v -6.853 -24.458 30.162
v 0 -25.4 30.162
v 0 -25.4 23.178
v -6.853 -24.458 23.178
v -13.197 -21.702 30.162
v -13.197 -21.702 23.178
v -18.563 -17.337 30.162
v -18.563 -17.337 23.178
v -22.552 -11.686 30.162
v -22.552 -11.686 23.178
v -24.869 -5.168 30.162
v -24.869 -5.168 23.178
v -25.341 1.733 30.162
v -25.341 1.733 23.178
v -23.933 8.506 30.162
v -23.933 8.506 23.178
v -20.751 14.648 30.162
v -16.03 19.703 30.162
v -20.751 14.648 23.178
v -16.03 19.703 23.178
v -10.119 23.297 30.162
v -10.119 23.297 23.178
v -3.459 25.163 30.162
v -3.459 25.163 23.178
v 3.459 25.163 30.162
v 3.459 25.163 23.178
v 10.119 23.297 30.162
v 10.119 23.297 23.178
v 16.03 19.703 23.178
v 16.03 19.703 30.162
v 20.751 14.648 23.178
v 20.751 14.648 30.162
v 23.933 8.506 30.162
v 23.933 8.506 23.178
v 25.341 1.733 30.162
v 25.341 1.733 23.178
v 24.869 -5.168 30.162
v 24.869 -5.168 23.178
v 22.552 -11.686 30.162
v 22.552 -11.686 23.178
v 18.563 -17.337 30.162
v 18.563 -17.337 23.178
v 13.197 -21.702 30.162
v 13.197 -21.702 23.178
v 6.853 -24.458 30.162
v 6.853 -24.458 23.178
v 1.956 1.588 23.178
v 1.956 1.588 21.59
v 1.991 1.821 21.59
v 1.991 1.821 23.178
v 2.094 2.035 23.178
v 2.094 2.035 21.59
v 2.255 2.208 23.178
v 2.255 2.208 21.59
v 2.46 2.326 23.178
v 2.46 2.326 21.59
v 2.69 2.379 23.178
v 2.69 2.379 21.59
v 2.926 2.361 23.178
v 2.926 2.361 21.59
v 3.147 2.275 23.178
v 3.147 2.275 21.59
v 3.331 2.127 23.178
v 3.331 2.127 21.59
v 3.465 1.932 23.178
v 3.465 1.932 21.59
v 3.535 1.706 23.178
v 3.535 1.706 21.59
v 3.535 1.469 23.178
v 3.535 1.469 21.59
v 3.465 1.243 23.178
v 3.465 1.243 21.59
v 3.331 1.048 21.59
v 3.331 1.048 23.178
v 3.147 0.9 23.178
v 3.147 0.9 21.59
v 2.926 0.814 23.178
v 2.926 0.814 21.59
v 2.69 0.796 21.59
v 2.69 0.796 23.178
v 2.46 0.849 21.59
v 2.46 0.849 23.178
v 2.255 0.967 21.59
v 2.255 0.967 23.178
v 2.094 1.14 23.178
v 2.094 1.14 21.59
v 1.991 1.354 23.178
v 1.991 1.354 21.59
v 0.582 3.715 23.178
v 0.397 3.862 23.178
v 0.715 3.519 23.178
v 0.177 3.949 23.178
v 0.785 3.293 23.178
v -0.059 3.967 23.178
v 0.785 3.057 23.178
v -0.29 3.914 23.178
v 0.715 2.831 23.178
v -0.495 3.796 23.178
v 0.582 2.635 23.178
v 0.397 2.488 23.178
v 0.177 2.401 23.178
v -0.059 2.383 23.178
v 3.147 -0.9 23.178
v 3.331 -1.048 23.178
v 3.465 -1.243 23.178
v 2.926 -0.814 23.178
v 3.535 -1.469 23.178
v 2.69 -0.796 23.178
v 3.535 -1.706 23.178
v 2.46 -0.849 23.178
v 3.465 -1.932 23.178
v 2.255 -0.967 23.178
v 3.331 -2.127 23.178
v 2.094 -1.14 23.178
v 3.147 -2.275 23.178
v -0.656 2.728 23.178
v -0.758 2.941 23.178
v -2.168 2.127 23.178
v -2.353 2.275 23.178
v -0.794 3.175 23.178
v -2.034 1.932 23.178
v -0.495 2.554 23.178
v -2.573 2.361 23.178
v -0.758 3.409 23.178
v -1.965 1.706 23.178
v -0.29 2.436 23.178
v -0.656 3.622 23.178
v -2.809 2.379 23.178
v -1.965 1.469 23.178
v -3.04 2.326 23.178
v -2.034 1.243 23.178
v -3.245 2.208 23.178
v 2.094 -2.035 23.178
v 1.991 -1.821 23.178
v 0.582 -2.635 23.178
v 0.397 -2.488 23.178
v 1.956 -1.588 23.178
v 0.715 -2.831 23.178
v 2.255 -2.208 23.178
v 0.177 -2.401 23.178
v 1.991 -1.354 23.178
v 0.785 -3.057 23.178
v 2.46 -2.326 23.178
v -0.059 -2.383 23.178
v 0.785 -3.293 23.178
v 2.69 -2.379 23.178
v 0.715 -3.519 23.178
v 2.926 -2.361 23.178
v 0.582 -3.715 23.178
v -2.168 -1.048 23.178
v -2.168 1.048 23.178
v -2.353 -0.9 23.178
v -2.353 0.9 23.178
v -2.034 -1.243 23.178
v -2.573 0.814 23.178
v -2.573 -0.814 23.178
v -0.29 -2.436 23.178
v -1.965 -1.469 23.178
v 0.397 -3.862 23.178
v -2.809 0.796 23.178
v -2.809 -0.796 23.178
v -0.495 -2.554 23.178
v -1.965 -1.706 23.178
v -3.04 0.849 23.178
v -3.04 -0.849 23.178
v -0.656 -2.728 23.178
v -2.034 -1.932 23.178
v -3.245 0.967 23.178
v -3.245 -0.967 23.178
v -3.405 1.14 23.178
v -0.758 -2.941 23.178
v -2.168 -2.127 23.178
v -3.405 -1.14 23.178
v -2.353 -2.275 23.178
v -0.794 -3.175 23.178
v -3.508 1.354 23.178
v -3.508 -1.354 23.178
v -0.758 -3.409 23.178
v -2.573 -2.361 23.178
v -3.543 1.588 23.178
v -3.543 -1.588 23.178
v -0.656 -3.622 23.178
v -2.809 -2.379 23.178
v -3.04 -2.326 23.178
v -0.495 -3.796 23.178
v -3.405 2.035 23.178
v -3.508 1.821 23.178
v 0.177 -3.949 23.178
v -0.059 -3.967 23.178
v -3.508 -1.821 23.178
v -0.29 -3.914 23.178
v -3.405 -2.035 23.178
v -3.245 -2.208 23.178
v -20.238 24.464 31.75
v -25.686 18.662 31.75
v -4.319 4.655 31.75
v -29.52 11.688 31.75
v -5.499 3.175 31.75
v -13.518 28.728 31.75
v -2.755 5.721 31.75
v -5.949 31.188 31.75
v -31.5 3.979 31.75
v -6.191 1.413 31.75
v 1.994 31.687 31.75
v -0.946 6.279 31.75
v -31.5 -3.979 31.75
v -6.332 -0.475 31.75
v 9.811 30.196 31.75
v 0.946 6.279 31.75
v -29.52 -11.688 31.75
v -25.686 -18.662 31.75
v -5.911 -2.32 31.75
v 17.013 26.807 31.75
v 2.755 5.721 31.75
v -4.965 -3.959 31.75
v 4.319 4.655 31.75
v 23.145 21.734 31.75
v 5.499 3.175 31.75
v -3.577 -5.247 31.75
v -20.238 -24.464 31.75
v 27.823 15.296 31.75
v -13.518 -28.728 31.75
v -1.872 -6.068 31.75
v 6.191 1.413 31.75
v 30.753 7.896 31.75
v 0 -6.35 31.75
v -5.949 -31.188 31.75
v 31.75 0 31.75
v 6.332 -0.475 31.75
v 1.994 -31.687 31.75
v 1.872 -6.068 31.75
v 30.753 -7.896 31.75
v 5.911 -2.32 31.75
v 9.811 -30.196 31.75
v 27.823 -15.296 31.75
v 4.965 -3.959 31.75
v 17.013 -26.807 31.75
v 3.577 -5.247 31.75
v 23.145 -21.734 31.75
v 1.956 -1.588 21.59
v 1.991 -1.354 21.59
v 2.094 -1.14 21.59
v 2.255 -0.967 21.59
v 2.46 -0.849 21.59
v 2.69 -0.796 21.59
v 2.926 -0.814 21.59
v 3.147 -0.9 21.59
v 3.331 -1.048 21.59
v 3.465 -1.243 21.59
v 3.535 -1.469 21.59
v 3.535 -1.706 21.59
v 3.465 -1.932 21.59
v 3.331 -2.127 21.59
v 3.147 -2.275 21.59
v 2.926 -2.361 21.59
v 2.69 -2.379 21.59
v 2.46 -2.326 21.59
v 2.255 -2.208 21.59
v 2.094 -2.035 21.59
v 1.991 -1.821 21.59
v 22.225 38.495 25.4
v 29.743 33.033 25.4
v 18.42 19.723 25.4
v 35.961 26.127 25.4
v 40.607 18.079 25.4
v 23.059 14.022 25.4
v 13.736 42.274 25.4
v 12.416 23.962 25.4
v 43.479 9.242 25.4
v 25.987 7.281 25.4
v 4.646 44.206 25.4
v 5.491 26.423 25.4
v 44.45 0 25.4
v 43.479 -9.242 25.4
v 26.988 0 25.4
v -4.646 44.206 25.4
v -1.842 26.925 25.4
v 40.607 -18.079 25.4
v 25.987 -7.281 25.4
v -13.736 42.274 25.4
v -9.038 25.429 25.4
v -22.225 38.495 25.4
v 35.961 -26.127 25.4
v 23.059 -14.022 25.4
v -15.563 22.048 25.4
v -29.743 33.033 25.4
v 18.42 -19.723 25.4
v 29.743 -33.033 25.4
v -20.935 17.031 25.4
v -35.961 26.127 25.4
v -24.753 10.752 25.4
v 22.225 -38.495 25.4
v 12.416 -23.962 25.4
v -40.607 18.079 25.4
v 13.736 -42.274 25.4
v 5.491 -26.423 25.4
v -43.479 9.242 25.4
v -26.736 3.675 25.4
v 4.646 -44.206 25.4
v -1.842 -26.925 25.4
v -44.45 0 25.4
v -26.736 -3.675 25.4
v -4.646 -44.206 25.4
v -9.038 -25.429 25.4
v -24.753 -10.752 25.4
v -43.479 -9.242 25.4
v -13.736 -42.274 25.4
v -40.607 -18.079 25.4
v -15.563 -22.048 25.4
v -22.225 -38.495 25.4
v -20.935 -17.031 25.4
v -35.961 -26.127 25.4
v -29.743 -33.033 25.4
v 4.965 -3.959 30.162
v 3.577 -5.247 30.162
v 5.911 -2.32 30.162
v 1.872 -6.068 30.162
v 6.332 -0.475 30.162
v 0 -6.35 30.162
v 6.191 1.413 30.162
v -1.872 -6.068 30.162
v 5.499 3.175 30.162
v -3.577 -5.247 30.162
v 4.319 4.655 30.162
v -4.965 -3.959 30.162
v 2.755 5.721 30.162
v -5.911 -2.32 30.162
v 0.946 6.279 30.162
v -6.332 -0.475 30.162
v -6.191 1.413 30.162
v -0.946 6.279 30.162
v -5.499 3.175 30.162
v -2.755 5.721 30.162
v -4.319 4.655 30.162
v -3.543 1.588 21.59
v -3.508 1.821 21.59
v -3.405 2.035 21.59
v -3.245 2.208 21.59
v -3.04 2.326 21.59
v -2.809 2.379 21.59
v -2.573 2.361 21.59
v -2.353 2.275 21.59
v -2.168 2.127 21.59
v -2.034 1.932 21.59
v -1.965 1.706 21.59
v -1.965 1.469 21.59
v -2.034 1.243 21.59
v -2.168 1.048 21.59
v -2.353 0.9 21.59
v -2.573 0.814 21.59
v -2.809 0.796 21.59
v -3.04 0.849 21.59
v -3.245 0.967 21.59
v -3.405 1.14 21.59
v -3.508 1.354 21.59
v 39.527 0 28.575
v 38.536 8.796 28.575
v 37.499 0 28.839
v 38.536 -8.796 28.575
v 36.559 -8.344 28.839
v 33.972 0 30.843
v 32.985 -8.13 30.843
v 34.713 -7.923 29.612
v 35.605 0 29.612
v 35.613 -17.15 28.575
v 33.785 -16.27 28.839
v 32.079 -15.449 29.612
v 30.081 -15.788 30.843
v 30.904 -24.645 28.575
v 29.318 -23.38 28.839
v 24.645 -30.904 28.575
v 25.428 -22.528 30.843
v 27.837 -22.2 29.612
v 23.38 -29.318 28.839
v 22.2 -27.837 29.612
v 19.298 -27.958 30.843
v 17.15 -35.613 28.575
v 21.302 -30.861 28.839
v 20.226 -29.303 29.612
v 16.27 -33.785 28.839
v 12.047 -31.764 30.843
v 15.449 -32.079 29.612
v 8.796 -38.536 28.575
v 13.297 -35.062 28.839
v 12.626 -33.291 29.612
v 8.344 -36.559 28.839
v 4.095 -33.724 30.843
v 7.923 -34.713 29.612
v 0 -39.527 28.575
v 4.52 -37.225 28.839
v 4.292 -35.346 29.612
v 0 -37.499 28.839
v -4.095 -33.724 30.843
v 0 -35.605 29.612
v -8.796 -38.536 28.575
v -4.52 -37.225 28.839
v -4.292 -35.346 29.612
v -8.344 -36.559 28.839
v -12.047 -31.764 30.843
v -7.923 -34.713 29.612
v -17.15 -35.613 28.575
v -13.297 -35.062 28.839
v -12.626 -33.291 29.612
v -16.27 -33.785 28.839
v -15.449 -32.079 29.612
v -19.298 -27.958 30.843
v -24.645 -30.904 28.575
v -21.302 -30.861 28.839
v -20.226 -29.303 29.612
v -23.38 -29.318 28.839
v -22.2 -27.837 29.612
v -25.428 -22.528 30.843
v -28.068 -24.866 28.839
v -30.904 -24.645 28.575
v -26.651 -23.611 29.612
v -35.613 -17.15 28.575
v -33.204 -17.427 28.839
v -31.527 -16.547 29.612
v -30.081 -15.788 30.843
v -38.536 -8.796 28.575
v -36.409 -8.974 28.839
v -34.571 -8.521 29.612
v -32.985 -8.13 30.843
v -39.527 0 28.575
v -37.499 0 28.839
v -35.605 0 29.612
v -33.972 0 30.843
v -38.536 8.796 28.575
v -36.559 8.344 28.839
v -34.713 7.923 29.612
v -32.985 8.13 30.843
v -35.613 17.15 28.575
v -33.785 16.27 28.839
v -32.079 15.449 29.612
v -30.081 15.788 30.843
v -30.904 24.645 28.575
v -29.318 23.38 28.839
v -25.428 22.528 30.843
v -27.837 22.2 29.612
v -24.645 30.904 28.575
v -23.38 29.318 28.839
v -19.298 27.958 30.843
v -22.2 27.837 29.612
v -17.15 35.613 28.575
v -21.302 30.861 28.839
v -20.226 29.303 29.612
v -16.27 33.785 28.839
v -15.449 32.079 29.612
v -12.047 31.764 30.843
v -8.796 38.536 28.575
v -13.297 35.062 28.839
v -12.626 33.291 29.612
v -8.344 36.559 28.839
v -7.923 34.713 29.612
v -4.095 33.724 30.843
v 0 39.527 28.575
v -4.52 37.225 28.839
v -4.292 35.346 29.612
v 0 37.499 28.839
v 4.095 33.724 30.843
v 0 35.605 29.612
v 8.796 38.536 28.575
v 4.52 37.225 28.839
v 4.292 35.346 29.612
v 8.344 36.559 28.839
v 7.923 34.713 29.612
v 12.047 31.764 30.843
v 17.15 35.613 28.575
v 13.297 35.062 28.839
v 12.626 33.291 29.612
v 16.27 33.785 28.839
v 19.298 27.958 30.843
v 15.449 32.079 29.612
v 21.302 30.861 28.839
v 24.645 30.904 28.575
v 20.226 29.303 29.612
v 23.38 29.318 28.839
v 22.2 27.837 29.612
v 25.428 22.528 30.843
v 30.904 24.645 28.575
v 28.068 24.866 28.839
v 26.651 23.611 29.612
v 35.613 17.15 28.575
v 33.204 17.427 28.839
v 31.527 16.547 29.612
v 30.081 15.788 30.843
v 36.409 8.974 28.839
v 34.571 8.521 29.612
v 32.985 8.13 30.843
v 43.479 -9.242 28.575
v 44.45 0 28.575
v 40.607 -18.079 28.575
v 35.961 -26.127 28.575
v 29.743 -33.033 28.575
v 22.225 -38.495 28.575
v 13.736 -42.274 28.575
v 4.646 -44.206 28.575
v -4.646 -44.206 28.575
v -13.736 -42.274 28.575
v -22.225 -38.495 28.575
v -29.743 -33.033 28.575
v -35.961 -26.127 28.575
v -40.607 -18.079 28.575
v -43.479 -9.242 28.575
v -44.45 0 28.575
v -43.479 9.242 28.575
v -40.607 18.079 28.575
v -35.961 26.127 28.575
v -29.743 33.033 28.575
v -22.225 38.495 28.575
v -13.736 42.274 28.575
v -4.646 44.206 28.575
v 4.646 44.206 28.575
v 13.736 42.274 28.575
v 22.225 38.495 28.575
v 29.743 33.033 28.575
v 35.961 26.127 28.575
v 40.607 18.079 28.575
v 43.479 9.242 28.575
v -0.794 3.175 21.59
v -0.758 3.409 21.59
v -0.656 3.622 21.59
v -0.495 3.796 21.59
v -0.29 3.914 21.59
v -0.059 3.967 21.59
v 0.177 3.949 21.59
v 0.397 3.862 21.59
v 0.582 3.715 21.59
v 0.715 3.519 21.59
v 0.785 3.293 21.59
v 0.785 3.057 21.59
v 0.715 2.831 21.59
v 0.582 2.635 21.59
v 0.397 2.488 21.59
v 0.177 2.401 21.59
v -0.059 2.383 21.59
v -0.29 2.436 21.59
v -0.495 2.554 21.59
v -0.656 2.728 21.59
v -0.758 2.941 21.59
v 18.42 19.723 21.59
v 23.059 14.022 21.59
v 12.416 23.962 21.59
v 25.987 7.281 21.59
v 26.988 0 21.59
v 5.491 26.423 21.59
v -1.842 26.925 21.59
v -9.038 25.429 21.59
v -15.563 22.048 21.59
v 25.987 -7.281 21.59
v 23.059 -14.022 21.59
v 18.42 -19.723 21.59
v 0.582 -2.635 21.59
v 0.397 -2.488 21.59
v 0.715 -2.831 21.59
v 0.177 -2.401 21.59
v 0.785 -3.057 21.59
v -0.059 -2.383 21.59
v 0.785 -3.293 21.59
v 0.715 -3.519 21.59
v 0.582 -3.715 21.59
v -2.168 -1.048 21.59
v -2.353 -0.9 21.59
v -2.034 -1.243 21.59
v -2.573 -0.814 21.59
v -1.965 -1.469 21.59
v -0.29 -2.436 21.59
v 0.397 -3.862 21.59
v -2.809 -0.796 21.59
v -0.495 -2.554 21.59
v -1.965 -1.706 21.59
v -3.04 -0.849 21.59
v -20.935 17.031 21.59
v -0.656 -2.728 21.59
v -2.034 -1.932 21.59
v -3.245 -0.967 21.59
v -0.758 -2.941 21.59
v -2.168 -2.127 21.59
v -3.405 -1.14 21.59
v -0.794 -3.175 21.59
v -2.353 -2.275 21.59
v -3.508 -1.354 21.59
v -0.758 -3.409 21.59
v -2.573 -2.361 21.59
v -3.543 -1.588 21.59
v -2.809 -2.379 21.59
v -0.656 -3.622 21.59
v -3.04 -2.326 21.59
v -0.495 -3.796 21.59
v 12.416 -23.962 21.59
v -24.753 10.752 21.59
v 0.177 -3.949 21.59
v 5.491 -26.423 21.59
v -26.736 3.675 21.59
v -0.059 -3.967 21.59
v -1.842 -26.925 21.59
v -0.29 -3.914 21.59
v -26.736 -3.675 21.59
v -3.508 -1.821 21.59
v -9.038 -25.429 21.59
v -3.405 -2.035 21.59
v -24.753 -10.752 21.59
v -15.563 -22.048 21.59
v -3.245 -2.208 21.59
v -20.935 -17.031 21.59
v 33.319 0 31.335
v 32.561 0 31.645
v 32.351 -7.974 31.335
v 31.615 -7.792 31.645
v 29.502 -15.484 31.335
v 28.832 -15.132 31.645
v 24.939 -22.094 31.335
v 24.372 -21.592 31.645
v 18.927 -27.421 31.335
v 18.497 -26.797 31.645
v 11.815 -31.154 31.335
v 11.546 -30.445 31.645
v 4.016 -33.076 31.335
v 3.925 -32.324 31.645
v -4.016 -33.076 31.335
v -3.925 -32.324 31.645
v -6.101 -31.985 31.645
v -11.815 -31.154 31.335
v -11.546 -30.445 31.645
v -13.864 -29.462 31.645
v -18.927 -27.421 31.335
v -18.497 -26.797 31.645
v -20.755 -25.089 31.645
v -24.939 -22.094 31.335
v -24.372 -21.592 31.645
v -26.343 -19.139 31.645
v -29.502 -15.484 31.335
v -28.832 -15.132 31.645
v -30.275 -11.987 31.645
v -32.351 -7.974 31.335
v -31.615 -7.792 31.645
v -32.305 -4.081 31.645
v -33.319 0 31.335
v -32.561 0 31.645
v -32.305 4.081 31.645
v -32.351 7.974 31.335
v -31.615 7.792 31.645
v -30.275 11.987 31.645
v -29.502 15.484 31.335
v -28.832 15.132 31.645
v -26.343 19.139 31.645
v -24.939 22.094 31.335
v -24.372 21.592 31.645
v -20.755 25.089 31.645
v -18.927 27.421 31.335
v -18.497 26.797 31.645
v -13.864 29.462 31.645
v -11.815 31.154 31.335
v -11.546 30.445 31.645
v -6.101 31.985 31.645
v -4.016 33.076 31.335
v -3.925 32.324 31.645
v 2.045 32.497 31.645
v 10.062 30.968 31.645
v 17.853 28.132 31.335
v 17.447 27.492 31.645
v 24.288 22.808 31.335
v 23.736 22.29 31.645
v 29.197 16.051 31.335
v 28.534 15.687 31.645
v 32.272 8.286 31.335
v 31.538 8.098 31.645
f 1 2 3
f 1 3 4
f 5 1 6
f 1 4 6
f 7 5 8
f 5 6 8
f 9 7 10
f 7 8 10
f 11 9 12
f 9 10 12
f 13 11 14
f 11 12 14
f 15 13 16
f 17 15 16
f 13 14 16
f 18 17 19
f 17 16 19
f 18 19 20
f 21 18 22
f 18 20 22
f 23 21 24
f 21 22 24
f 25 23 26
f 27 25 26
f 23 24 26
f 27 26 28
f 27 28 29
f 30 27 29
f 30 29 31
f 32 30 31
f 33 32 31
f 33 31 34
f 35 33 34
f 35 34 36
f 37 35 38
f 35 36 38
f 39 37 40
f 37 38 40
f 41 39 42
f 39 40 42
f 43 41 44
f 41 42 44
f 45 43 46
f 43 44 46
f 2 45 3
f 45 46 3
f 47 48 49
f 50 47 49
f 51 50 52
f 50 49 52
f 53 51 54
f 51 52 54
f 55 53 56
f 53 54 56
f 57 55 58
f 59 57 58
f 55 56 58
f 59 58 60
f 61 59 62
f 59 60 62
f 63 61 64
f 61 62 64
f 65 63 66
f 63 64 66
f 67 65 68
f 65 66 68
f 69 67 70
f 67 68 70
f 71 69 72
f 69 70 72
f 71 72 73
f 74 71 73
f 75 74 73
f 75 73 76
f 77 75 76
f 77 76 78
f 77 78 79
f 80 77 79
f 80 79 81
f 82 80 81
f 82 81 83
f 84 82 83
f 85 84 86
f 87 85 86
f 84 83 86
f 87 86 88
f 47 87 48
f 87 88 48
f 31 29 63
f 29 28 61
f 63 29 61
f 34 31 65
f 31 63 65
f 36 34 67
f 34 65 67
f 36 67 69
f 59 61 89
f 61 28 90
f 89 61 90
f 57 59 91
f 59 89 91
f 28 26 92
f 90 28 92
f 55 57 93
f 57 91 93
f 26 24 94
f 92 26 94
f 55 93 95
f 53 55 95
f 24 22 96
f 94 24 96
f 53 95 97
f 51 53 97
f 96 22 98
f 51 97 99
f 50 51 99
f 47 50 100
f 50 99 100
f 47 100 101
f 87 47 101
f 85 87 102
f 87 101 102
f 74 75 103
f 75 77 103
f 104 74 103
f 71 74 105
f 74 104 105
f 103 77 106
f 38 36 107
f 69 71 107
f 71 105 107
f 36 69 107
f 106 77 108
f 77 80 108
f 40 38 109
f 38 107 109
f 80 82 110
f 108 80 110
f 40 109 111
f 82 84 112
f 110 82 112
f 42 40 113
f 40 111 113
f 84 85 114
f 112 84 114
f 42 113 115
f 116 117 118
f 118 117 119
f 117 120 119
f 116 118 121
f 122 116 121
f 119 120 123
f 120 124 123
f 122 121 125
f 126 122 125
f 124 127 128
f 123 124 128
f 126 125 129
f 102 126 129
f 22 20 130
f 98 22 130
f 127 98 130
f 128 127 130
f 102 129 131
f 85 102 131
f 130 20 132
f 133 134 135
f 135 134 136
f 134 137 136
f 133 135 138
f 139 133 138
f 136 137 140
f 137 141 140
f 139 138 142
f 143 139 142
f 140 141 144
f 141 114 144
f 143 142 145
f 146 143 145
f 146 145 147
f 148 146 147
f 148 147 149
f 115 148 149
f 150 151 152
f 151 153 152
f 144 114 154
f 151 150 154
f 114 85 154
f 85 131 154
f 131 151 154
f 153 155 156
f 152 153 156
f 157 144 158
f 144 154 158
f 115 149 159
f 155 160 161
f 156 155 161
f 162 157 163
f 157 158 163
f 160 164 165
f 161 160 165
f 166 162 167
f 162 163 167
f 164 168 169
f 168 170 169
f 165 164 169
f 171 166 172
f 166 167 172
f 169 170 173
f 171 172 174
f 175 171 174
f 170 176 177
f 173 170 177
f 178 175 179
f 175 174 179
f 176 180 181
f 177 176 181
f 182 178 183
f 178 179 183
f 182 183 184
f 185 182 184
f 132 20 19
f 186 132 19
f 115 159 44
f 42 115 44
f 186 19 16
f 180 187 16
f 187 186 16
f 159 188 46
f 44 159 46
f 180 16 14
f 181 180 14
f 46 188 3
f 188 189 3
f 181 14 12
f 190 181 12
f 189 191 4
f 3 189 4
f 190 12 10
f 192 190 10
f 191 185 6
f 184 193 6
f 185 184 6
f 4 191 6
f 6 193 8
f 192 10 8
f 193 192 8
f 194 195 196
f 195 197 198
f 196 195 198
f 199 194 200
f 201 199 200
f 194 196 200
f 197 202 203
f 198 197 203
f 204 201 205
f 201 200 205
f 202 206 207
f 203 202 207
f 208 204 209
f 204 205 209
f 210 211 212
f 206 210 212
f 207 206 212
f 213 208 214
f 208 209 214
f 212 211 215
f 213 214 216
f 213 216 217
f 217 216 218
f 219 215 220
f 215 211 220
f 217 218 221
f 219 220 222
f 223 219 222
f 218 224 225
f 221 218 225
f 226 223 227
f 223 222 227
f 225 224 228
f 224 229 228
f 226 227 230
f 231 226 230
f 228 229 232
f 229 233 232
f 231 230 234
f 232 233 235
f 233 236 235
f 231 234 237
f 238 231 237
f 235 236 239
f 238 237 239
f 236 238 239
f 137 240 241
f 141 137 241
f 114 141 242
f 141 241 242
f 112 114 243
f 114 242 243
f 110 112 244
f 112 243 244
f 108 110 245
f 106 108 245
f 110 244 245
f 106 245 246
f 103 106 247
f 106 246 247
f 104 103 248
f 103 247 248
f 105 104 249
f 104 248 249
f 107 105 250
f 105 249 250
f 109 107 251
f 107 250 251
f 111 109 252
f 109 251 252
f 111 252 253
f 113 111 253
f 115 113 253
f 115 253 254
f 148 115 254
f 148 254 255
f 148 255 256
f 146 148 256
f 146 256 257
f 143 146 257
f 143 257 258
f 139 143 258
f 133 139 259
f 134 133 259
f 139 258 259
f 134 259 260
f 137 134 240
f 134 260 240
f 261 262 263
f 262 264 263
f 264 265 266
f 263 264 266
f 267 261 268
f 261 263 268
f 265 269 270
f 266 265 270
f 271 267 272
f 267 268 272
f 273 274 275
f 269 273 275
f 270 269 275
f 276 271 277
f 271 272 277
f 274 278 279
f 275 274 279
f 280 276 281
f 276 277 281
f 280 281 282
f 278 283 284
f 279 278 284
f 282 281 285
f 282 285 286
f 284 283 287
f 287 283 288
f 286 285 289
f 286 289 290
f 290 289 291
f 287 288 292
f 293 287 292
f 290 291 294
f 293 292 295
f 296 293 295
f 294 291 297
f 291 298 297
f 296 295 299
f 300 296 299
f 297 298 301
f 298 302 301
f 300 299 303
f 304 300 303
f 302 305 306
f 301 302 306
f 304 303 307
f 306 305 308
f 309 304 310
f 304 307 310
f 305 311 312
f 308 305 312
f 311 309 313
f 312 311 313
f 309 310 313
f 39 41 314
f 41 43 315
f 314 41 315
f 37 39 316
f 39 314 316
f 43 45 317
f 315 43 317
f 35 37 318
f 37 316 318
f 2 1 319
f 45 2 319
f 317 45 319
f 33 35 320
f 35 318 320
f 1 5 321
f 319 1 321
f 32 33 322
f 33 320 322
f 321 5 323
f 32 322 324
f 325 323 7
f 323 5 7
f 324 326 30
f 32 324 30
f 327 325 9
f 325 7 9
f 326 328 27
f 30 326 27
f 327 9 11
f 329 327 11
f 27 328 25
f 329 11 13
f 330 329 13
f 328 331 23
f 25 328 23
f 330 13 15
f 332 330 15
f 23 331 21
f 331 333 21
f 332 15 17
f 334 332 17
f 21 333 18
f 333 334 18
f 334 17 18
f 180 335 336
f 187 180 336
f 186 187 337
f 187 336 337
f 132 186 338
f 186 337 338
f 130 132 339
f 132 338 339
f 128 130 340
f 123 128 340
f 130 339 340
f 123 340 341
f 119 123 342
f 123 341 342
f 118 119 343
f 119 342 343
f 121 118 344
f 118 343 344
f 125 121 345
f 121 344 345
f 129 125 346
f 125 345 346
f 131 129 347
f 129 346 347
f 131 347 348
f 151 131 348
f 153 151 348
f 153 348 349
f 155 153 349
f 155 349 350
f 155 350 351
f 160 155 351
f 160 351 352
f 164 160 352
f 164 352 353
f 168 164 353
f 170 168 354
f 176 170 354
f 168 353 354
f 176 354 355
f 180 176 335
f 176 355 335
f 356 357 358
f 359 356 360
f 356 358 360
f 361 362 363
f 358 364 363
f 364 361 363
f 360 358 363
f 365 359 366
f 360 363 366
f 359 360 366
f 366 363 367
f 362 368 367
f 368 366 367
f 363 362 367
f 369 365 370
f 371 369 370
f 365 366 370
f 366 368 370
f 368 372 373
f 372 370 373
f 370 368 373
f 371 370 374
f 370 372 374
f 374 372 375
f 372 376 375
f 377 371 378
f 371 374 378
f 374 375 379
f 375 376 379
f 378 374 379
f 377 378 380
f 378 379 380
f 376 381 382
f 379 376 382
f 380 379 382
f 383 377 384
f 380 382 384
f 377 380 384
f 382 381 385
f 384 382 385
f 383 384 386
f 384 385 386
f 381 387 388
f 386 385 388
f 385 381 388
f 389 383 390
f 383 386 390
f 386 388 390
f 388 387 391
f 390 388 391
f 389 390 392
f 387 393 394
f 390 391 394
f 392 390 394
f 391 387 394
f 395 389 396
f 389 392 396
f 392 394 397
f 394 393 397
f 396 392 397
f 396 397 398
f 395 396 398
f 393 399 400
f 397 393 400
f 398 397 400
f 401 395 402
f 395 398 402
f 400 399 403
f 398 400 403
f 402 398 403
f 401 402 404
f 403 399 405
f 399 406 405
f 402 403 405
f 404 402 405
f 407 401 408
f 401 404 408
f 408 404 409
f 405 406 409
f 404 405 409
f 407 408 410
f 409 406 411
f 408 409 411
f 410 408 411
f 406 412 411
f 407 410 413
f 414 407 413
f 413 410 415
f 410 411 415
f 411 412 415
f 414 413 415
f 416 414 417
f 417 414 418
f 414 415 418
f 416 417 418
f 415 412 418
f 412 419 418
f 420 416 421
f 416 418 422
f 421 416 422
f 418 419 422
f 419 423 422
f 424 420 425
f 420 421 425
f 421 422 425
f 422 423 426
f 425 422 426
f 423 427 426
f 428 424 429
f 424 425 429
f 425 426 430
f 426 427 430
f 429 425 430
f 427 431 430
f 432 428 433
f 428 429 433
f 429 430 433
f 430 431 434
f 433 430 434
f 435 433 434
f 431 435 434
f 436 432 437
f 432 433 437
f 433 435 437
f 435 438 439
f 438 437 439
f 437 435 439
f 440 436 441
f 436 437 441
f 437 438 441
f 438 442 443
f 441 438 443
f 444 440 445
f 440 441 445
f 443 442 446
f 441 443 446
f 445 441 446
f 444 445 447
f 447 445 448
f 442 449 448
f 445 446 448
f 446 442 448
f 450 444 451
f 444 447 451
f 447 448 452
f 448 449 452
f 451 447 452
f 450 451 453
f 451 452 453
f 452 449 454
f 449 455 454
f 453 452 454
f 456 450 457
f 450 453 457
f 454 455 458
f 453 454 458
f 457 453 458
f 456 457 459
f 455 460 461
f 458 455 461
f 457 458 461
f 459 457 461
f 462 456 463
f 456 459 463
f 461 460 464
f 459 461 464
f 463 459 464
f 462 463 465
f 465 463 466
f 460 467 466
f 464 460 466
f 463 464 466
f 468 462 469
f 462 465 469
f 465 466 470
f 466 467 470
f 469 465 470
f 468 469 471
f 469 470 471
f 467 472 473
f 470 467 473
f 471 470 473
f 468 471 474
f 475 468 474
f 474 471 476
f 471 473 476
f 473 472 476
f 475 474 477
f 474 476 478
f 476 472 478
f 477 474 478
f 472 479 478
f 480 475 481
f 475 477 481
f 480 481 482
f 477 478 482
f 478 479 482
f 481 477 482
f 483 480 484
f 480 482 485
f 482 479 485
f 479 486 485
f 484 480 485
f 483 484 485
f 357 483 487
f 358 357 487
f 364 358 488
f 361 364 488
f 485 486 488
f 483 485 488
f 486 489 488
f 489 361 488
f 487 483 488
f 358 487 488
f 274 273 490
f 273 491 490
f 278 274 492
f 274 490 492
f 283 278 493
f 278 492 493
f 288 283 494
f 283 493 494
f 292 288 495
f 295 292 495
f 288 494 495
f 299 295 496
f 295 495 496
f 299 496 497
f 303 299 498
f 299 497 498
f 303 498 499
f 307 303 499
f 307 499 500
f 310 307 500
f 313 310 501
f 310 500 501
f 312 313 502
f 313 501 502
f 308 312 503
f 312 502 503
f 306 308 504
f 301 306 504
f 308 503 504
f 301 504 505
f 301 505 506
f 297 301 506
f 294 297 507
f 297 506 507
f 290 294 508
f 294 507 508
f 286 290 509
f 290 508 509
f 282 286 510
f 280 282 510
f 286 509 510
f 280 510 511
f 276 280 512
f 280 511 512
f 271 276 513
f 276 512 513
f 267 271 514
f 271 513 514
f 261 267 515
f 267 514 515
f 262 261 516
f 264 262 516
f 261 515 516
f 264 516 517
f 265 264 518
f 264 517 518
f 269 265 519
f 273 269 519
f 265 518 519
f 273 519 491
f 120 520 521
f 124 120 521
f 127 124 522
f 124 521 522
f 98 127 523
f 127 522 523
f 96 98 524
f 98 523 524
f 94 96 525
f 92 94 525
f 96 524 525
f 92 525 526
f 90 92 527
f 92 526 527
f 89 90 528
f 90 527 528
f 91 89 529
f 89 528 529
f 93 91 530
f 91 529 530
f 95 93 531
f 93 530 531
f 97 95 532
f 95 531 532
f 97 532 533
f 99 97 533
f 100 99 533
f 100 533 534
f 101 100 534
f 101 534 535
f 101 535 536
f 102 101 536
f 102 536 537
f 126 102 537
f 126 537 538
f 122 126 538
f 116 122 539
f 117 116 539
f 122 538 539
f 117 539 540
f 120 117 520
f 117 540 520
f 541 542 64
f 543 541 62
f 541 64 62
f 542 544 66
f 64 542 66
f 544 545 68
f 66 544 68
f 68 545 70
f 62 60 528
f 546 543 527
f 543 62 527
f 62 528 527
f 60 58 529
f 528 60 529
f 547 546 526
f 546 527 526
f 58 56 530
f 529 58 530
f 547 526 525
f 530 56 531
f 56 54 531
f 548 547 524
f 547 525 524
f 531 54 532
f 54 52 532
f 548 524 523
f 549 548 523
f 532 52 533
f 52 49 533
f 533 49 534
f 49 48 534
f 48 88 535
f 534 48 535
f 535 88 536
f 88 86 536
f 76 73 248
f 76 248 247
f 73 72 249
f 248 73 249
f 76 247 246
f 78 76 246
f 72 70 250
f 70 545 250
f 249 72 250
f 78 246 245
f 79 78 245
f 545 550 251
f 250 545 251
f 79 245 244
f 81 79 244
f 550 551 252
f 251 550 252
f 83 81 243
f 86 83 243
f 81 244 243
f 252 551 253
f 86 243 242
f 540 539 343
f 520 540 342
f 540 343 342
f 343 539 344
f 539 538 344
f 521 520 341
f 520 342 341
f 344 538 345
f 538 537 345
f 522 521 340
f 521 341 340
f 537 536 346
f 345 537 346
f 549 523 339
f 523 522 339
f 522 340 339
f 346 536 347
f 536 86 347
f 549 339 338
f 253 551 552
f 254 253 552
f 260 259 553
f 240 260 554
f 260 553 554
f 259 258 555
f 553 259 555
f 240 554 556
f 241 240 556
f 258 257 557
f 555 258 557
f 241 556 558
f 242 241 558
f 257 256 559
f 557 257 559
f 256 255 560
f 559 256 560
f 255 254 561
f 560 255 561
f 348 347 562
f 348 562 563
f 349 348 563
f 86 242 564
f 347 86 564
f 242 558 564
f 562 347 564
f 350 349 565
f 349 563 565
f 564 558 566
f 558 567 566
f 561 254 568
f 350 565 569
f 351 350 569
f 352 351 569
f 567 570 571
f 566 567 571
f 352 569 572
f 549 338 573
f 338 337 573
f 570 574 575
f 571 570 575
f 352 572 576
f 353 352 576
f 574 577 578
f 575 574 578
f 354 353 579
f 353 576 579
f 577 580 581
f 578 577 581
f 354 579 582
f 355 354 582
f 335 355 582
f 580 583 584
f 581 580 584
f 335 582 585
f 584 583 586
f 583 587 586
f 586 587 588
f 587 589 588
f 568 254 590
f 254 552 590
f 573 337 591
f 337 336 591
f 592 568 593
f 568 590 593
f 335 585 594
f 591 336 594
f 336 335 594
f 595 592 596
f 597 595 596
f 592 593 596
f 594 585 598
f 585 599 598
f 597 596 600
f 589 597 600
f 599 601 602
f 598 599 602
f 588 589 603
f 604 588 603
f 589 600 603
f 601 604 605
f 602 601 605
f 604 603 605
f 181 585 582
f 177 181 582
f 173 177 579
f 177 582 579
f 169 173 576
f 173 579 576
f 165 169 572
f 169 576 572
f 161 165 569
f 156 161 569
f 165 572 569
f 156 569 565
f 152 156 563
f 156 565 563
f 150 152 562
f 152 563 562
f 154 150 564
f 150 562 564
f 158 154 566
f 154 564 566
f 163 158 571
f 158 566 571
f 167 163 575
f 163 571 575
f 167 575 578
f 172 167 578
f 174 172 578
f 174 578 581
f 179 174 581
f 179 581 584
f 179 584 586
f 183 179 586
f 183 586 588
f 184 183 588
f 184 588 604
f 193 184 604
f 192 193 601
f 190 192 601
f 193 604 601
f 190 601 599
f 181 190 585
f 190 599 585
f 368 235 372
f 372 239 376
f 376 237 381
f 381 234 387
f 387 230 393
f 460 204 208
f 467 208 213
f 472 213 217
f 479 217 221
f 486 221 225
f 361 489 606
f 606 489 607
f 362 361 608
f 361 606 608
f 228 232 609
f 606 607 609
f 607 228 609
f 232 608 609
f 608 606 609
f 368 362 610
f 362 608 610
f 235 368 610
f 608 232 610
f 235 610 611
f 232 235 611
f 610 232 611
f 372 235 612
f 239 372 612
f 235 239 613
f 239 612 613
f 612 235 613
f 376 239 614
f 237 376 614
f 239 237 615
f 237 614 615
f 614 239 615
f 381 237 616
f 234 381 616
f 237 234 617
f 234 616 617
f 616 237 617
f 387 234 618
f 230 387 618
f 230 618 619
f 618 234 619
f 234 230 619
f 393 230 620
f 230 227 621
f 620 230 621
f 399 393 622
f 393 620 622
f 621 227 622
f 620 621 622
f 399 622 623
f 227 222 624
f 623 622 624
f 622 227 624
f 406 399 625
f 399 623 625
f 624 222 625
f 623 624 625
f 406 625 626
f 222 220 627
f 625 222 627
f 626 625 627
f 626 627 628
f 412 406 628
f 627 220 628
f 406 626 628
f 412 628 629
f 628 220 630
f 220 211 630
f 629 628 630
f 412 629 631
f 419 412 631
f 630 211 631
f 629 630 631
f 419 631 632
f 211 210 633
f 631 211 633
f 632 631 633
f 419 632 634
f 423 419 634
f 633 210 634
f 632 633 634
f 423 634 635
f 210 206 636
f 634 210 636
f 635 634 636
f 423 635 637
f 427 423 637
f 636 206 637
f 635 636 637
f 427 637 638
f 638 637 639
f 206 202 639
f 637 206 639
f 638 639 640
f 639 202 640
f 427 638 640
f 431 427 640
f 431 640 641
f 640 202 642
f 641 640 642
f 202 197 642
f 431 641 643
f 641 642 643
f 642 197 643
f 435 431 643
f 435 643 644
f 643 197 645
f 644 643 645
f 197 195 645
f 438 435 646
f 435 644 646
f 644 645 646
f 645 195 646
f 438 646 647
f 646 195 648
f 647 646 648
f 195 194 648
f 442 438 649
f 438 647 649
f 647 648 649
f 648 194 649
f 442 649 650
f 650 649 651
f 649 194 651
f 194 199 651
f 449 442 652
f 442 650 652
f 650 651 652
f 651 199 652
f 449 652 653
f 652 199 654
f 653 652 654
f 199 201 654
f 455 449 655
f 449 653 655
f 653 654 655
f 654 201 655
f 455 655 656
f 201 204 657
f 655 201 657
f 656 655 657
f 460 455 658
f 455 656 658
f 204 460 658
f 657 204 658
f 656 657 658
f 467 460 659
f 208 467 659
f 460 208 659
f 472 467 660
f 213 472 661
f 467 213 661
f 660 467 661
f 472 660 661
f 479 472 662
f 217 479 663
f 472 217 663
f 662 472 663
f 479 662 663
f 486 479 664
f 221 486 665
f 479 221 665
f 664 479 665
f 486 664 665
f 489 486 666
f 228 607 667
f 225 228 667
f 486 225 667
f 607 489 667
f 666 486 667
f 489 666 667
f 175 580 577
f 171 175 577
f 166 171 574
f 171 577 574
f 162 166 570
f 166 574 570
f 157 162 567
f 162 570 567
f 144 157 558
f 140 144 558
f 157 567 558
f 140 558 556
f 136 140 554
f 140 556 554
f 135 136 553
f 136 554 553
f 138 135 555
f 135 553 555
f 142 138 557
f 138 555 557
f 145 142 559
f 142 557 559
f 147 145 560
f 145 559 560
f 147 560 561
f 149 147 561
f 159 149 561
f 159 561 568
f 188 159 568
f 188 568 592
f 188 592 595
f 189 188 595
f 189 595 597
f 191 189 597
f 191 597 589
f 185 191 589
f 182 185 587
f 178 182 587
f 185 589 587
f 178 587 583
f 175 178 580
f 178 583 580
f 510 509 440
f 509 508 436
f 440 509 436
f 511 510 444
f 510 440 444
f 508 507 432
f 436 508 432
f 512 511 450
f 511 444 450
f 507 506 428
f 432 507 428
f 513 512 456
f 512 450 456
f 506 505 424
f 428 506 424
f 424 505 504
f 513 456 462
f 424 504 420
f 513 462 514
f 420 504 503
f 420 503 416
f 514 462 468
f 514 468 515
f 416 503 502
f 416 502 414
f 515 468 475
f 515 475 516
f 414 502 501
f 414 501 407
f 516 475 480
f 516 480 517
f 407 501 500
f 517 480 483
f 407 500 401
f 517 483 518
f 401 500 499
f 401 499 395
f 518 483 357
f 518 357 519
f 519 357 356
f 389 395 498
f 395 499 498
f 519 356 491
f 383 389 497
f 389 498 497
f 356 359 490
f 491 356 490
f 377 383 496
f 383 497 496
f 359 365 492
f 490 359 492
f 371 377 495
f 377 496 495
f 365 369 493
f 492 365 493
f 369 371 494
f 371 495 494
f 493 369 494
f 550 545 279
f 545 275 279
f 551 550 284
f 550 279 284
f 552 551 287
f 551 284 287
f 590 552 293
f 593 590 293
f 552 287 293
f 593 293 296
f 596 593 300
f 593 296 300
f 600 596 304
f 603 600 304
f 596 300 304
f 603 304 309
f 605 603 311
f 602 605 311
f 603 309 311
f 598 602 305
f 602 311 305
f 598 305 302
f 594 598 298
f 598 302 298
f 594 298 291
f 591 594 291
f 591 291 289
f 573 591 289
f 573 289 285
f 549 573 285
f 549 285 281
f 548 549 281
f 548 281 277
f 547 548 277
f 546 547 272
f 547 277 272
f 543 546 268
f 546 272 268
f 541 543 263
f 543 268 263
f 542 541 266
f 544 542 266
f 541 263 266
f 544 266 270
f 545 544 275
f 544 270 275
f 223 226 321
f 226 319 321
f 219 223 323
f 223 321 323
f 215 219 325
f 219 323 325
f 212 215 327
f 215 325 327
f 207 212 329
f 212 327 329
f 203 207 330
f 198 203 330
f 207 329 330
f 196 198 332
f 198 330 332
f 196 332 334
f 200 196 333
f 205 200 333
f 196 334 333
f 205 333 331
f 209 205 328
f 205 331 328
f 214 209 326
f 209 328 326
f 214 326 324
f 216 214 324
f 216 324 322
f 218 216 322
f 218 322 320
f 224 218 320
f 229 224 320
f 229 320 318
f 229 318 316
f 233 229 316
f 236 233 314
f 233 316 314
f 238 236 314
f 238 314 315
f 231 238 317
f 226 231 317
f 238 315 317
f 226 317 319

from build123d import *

# Parameters (mm, degrees)
SKETCH3_R          = 0.79375
CUT_EXTRUDE1_DEPTH = 1.5875


with BuildPart() as part:
    # Sketch1 → Revolve1 (revolve)
    with BuildSketch(Plane(origin=(0, 0, 0), x_dir=(0, 0, -1), z_dir=(1, 0, 0)), mode=Mode.PRIVATE) as revolve1_sk:
        with BuildLine():
            Line((-21.59, 0), (-21.59, 26.9875))
            Line((-21.59, 26.9875), (-25.4, 26.9875))
            Line((-25.4, 26.9875), (-25.4, 44.45))
            Line((-25.4, 44.45), (-28.575, 44.45))
            Line((-28.575, 44.45), (-28.575, 39.527129933))
            ThreePointArc((-28.575, 39.527129933), (-29.163802958, 36.527036929), (-30.842857143, 33.972037124))
            ThreePointArc((-30.842857143, 33.972037124), (-31.514478817, 32.950037202), (-31.75, 31.75))
            Line((-31.75, 31.75), (-31.75, 0))
            Line((-31.75, 0), (-21.59, 0))
        make_face()
    revolve(revolve1_sk.sketch.rotate(Axis((0, 0, 31.75), (0, 0, -1)), 90), axis=Axis((0, 0, 31.75), (0, 0, -1)))

    # Sketch2 → Cut-Revolve1 (revolve, cut)
    with BuildSketch(Plane(origin=(0, 0, 0), x_dir=(0, 0, -1), z_dir=(1, 0, 0)), mode=Mode.PRIVATE) as cut_revolve1_sk:
        Polygon((-30.1625, 25.4), (-23.1775, 25.4), (-23.1775, 0), (-31.75, 0), (-31.75, 6.35), (-30.1625, 6.35), align=None)
    revolve(cut_revolve1_sk.sketch.rotate(Axis((0, 0, 31.75), (0, 0, -1)), 180), axis=Axis((0, 0, 31.75), (0, 0, -1)), mode=Mode.SUBTRACT)

    # Sketch3 → Cut-Extrude1 (cut)
    with BuildSketch(Plane(origin=(0, 0, 21.59), x_dir=(-1, 0, 0), z_dir=(0, 0, -1))):
        with Locations((0, 3.175)):
            Circle(SKETCH3_R)
        with Locations((2.749630657, 1.5875)):
            Circle(SKETCH3_R)
        with Locations((2.749630657, -1.5875)):
            Circle(SKETCH3_R)
        with Locations((0, -3.175)):
            Circle(SKETCH3_R)
        with Locations((-2.749630657, -1.5875)):
            Circle(SKETCH3_R)
        with Locations((-2.749630657, 1.5875)):
            Circle(SKETCH3_R)
    extrude(amount=-CUT_EXTRUDE1_DEPTH, mode=Mode.SUBTRACT)


solid = part.part
